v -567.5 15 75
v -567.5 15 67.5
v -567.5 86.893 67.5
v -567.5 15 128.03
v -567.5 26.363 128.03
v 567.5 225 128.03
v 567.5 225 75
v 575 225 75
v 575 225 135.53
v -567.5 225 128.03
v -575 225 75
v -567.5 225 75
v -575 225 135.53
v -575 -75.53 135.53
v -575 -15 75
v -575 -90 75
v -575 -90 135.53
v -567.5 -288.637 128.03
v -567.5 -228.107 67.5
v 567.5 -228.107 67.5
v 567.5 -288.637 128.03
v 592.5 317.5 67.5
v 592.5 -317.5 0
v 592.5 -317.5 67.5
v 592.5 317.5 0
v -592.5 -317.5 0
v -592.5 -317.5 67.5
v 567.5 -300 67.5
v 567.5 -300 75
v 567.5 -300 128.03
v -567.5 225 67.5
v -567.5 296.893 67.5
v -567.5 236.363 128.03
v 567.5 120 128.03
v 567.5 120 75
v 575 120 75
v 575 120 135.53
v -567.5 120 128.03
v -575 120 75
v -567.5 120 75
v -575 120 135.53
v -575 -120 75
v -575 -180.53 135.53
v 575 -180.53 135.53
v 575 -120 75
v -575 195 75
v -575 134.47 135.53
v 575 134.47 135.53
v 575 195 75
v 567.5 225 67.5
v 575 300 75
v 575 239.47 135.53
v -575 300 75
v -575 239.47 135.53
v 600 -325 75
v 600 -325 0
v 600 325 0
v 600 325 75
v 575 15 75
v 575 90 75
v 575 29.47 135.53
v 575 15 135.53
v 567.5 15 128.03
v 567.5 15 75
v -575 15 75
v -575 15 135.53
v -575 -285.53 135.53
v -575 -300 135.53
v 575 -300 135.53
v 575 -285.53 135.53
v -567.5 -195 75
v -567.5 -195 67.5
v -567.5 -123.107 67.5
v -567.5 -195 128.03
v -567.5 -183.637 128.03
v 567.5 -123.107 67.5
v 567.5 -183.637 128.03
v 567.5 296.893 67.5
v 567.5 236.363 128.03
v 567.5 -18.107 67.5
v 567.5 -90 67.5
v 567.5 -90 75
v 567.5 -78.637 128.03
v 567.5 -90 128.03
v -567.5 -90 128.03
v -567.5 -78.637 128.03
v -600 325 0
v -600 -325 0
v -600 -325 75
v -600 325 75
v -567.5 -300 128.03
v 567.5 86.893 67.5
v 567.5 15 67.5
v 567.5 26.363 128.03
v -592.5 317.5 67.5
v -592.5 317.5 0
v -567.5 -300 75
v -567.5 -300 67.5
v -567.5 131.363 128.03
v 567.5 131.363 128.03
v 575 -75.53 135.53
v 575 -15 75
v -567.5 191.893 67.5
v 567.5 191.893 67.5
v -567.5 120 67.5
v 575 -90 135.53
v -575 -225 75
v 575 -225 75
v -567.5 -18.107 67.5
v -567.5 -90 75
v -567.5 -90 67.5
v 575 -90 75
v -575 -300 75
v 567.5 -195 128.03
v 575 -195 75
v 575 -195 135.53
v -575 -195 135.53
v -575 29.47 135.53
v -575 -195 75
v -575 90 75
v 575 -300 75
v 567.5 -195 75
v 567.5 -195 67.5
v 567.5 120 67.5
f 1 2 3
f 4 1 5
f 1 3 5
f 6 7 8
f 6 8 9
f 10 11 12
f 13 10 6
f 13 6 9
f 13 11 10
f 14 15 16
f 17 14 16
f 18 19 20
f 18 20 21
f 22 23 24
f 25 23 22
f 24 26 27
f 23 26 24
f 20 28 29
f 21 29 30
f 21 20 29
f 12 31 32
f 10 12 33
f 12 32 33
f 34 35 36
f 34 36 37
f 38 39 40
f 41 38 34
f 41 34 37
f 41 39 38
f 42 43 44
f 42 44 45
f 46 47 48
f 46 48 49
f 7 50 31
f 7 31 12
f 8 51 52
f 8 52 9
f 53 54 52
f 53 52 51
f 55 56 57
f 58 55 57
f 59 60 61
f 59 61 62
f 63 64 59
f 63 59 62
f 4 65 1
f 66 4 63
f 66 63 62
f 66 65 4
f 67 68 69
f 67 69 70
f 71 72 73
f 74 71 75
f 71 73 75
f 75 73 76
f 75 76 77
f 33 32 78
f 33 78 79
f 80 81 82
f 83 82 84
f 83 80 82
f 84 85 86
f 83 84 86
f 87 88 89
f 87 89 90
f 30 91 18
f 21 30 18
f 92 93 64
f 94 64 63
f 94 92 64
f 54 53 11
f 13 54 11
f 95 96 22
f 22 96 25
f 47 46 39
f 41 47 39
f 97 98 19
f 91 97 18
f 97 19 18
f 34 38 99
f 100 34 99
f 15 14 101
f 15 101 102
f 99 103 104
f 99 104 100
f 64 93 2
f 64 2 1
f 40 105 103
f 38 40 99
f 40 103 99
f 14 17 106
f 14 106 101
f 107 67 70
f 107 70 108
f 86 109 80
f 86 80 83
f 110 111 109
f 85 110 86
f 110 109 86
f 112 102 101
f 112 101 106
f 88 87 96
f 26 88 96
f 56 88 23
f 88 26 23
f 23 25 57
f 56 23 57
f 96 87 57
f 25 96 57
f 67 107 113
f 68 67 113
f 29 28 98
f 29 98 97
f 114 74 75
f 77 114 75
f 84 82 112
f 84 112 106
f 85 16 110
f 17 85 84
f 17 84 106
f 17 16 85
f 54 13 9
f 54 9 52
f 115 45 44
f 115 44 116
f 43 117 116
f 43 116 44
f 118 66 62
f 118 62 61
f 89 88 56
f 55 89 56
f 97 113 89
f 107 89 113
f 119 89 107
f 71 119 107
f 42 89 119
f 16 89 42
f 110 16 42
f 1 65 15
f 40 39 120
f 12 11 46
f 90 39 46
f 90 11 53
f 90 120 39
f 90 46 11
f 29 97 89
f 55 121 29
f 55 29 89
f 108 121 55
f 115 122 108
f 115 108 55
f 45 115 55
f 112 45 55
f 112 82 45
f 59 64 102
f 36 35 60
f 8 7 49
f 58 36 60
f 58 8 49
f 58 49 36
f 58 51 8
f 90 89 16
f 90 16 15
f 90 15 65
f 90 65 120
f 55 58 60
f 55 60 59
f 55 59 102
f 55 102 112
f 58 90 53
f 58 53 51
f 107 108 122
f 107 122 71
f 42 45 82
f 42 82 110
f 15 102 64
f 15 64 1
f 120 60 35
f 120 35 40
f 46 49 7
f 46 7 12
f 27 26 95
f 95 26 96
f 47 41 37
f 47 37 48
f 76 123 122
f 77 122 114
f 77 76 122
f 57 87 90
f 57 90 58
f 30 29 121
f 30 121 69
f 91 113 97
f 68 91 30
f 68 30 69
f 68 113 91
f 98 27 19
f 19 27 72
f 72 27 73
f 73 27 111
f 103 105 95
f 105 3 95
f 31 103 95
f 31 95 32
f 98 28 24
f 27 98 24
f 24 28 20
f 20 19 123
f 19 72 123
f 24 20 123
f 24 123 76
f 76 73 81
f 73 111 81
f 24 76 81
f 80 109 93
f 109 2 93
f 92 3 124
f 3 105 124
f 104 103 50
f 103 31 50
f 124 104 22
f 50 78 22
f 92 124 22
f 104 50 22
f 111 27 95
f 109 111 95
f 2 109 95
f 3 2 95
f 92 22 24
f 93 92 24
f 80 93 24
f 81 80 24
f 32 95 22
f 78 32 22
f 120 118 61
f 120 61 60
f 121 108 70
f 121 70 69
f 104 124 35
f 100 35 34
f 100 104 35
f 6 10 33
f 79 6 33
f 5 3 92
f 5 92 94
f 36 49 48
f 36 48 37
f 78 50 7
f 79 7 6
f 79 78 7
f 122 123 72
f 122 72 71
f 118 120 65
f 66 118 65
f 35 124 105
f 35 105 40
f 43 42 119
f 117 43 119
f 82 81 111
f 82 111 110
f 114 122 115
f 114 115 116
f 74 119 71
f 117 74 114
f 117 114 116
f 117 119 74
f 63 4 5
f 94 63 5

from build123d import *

# Parameters (mm, degrees)
F0_W         = 1200
F0_H         = 650
F1_DEPTH     = 75
F3_START     = -25
F3_DEPTH     = 1150
F4_T         = 7.5
F4_T3_DEPTH  = 90
F4_T5_DEPTH  = 1165
F4_T7_DEPTH  = 90
F4_T9_DEPTH  = 90
F4_T11_DEPTH = 90
F4_T13_DEPTH = 90
F4_T15_DEPTH = 90


# Not quite as in the source:
# - a shell that OpenCascade refuses in one call is made with other operations: the cavity is built on its own and cut out
# - a feature names something its author has since deleted; it is built from what else it names


with BuildPart() as f1:
    # F0 (on Top) → F1 (new body)
    with BuildSketch(Plane.XY):
        Rectangle(F0_W, F0_H)
    extrude(amount=F1_DEPTH)

    # F2 (on face) → F3 (join)
    with BuildSketch(Plane(origin=(-600, 0, 0), x_dir=(0, -1, 0), z_dir=(-1, 0, 0)).offset(F3_START)):
        Polygon((-239.4699645042, 135.5300354958), (-300, 75), (-225, 75), (-225, 135.5300354958), align=None)
        Polygon((-134.4699645042, 135.5300354958), (-195, 75), (-120, 75), (-120, 135.5300354958), align=None)
        Polygon((-29.4699645042, 135.5300354958), (-90, 75), (-15, 75), (-15, 135.5300354958), align=None)
        Polygon((75.5300354958, 135.5300354958), (15, 75), (90, 75), (90, 135.5300354958), align=None)
        Polygon((120, 75), (195, 75), (195, 135.5300354958), (180.5300354958, 135.5300354958), align=None)
        Polygon((225, 75), (300, 75), (300, 135.5300354958), (285.5300354958, 135.5300354958), align=None)
    extrude(amount=-F3_DEPTH)

    # F4: shell of thickness 7.5, made by hand


with BuildPart() as f4_core1:
    # F4_t2: copy of F1
    add(f1.part)

    # the walls: a layer under each face that stays
    f4_faces = [f4_core1.faces().sort_by_distance(p)[0] for p in [
        (0, -325, 37.5),
        (-600, 0, 37.5),
        (600, 0, 37.5),
        (0, 0, 75),
        (0, 325, 37.5),
        (-575, -262.5, 105.2650177479),
        (575, -262.5, 105.2650177479),
        (0, -255.2650177479, 105.2650177479),
        (-575, -157.5, 105.2650177479),
        (575, -157.5, 105.2650177479),
        (0, -150.2650177479, 105.2650177479),
        (-575, -52.5, 105.2650177479),
        (575, -52.5, 105.2650177479),
        (0, -45.2650177479, 105.2650177479),
        (-575, 52.5, 105.2650177479),
        (575, 52.5, 105.2650177479),
        (0, 59.7349822521, 105.2650177479),
        (-575, 157.5, 105.2650177479),
        (575, 157.5, 105.2650177479),
        (0, 164.7349822521, 105.2650177479),
        (-575, 262.5, 105.2650177479),
        (575, 262.5, 105.2650177479),
        (0, 269.7349822521, 105.2650177479),
        (0, -292.7650177479, 135.5300354958),
        (0, -187.7650177479, 135.5300354958),
        (0, -82.7650177479, 135.5300354958),
        (0, 22.2349822521, 135.5300354958),
        (0, 127.2349822521, 135.5300354958),
        (0, 232.2349822521, 135.5300354958),
    ]]
    thicken(f4_faces, amount=-F4_T, mode=Mode.SUBTRACT)

    # F4_s4 → F4_t3 (cut)
    with BuildSketch(Plane.XZ.offset(217.5)):
        Polygon((-575.075, 75.075), (-575, 67.5), (-567.5, 67.5), (-567.5, 75), align=None)
        Polygon((575.075, 75.075), (575, 67.5), (567.5, 67.5), (567.5, 75), align=None)
    extrude(amount=F4_T3_DEPTH, mode=Mode.SUBTRACT)

    # F4_s6 → F4_t5 (cut)
    with BuildSketch(Plane.YZ.offset(-582.5)):
        Polygon((-224.9469669914, 75.1280330086), (-225, 67.5), (-228.1066017178, 67.5), (-230.3033008589, 69.6966991411), align=None)
        Polygon((-119.9469669914, 75.1280330086), (-120, 67.5), (-123.1066017178, 67.5), (-125.3033008589, 69.6966991411), align=None)
        Polygon((-14.9469669914, 75.1280330086), (-15, 67.5), (-18.1066017178, 67.5), (-20.3033008589, 69.6966991411), align=None)
        Polygon((90.0530330086, 75.1280330086), (90, 67.5), (86.8933982822, 67.5), (84.6966991411, 69.6966991411), align=None)
        Polygon((195.0530330086, 75.1280330086), (195, 67.5), (191.8933982822, 67.5), (189.6966991411, 69.6966991411), align=None)
        Polygon((300.0530330086, 75.1280330086), (300, 67.5), (296.8933982822, 67.5), (294.6966991411, 69.6966991411), align=None)
    extrude(amount=F4_T5_DEPTH, mode=Mode.SUBTRACT)

    # F4_s8 → F4_t7 (cut)
    with BuildSketch(Plane.XZ.offset(112.5)):
        Polygon((-575.075, 75.075), (-575, 67.5), (-567.5, 67.5), (-567.5, 75), align=None)
        Polygon((575.075, 75.075), (575, 67.5), (567.5, 67.5), (567.5, 75), align=None)
    extrude(amount=F4_T7_DEPTH, mode=Mode.SUBTRACT)

    # F4_s10 → F4_t9 (cut)
    with BuildSketch(Plane.XZ.offset(7.5)):
        Polygon((-575.075, 75.075), (-575, 67.5), (-567.5, 67.5), (-567.5, 75), align=None)
        Polygon((575.075, 75.075), (575, 67.5), (567.5, 67.5), (567.5, 75), align=None)
    extrude(amount=F4_T9_DEPTH, mode=Mode.SUBTRACT)

    # F4_s12 → F4_t11 (cut)
    with BuildSketch(Plane.XZ.offset(-97.5)):
        Polygon((-575.075, 75.075), (-575, 67.5), (-567.5, 67.5), (-567.5, 75), align=None)
        Polygon((575.075, 75.075), (575, 67.5), (567.5, 67.5), (567.5, 75), align=None)
    extrude(amount=F4_T11_DEPTH, mode=Mode.SUBTRACT)

    # F4_s14 → F4_t13 (cut)
    with BuildSketch(Plane.XZ.offset(-202.5)):
        Polygon((-575.075, 75.075), (-575, 67.5), (-567.5, 67.5), (-567.5, 75), align=None)
        Polygon((575.075, 75.075), (575, 67.5), (567.5, 67.5), (567.5, 75), align=None)
    extrude(amount=F4_T13_DEPTH, mode=Mode.SUBTRACT)

    # F4_s16 → F4_t15 (cut)
    with BuildSketch(Plane.XZ.offset(-307.5)):
        Polygon((-575.075, 75.075), (-575, 67.5), (-567.5, 67.5), (-567.5, 75), align=None)
        Polygon((575.075, 75.075), (575, 67.5), (567.5, 67.5), (567.5, 75), align=None)
    extrude(amount=F4_T15_DEPTH, mode=Mode.SUBTRACT)


with BuildPart() as f1_1:
    add(f1.part)

    # what is left inside the walls is the cavity
    f4_cavity = [f4_core1.part.solids().sort_by_distance(p)[0] for p in [
        (0, -105.833333, 0.075),
    ]]
    add(f4_cavity, mode=Mode.SUBTRACT)


solid = f1_1.part
